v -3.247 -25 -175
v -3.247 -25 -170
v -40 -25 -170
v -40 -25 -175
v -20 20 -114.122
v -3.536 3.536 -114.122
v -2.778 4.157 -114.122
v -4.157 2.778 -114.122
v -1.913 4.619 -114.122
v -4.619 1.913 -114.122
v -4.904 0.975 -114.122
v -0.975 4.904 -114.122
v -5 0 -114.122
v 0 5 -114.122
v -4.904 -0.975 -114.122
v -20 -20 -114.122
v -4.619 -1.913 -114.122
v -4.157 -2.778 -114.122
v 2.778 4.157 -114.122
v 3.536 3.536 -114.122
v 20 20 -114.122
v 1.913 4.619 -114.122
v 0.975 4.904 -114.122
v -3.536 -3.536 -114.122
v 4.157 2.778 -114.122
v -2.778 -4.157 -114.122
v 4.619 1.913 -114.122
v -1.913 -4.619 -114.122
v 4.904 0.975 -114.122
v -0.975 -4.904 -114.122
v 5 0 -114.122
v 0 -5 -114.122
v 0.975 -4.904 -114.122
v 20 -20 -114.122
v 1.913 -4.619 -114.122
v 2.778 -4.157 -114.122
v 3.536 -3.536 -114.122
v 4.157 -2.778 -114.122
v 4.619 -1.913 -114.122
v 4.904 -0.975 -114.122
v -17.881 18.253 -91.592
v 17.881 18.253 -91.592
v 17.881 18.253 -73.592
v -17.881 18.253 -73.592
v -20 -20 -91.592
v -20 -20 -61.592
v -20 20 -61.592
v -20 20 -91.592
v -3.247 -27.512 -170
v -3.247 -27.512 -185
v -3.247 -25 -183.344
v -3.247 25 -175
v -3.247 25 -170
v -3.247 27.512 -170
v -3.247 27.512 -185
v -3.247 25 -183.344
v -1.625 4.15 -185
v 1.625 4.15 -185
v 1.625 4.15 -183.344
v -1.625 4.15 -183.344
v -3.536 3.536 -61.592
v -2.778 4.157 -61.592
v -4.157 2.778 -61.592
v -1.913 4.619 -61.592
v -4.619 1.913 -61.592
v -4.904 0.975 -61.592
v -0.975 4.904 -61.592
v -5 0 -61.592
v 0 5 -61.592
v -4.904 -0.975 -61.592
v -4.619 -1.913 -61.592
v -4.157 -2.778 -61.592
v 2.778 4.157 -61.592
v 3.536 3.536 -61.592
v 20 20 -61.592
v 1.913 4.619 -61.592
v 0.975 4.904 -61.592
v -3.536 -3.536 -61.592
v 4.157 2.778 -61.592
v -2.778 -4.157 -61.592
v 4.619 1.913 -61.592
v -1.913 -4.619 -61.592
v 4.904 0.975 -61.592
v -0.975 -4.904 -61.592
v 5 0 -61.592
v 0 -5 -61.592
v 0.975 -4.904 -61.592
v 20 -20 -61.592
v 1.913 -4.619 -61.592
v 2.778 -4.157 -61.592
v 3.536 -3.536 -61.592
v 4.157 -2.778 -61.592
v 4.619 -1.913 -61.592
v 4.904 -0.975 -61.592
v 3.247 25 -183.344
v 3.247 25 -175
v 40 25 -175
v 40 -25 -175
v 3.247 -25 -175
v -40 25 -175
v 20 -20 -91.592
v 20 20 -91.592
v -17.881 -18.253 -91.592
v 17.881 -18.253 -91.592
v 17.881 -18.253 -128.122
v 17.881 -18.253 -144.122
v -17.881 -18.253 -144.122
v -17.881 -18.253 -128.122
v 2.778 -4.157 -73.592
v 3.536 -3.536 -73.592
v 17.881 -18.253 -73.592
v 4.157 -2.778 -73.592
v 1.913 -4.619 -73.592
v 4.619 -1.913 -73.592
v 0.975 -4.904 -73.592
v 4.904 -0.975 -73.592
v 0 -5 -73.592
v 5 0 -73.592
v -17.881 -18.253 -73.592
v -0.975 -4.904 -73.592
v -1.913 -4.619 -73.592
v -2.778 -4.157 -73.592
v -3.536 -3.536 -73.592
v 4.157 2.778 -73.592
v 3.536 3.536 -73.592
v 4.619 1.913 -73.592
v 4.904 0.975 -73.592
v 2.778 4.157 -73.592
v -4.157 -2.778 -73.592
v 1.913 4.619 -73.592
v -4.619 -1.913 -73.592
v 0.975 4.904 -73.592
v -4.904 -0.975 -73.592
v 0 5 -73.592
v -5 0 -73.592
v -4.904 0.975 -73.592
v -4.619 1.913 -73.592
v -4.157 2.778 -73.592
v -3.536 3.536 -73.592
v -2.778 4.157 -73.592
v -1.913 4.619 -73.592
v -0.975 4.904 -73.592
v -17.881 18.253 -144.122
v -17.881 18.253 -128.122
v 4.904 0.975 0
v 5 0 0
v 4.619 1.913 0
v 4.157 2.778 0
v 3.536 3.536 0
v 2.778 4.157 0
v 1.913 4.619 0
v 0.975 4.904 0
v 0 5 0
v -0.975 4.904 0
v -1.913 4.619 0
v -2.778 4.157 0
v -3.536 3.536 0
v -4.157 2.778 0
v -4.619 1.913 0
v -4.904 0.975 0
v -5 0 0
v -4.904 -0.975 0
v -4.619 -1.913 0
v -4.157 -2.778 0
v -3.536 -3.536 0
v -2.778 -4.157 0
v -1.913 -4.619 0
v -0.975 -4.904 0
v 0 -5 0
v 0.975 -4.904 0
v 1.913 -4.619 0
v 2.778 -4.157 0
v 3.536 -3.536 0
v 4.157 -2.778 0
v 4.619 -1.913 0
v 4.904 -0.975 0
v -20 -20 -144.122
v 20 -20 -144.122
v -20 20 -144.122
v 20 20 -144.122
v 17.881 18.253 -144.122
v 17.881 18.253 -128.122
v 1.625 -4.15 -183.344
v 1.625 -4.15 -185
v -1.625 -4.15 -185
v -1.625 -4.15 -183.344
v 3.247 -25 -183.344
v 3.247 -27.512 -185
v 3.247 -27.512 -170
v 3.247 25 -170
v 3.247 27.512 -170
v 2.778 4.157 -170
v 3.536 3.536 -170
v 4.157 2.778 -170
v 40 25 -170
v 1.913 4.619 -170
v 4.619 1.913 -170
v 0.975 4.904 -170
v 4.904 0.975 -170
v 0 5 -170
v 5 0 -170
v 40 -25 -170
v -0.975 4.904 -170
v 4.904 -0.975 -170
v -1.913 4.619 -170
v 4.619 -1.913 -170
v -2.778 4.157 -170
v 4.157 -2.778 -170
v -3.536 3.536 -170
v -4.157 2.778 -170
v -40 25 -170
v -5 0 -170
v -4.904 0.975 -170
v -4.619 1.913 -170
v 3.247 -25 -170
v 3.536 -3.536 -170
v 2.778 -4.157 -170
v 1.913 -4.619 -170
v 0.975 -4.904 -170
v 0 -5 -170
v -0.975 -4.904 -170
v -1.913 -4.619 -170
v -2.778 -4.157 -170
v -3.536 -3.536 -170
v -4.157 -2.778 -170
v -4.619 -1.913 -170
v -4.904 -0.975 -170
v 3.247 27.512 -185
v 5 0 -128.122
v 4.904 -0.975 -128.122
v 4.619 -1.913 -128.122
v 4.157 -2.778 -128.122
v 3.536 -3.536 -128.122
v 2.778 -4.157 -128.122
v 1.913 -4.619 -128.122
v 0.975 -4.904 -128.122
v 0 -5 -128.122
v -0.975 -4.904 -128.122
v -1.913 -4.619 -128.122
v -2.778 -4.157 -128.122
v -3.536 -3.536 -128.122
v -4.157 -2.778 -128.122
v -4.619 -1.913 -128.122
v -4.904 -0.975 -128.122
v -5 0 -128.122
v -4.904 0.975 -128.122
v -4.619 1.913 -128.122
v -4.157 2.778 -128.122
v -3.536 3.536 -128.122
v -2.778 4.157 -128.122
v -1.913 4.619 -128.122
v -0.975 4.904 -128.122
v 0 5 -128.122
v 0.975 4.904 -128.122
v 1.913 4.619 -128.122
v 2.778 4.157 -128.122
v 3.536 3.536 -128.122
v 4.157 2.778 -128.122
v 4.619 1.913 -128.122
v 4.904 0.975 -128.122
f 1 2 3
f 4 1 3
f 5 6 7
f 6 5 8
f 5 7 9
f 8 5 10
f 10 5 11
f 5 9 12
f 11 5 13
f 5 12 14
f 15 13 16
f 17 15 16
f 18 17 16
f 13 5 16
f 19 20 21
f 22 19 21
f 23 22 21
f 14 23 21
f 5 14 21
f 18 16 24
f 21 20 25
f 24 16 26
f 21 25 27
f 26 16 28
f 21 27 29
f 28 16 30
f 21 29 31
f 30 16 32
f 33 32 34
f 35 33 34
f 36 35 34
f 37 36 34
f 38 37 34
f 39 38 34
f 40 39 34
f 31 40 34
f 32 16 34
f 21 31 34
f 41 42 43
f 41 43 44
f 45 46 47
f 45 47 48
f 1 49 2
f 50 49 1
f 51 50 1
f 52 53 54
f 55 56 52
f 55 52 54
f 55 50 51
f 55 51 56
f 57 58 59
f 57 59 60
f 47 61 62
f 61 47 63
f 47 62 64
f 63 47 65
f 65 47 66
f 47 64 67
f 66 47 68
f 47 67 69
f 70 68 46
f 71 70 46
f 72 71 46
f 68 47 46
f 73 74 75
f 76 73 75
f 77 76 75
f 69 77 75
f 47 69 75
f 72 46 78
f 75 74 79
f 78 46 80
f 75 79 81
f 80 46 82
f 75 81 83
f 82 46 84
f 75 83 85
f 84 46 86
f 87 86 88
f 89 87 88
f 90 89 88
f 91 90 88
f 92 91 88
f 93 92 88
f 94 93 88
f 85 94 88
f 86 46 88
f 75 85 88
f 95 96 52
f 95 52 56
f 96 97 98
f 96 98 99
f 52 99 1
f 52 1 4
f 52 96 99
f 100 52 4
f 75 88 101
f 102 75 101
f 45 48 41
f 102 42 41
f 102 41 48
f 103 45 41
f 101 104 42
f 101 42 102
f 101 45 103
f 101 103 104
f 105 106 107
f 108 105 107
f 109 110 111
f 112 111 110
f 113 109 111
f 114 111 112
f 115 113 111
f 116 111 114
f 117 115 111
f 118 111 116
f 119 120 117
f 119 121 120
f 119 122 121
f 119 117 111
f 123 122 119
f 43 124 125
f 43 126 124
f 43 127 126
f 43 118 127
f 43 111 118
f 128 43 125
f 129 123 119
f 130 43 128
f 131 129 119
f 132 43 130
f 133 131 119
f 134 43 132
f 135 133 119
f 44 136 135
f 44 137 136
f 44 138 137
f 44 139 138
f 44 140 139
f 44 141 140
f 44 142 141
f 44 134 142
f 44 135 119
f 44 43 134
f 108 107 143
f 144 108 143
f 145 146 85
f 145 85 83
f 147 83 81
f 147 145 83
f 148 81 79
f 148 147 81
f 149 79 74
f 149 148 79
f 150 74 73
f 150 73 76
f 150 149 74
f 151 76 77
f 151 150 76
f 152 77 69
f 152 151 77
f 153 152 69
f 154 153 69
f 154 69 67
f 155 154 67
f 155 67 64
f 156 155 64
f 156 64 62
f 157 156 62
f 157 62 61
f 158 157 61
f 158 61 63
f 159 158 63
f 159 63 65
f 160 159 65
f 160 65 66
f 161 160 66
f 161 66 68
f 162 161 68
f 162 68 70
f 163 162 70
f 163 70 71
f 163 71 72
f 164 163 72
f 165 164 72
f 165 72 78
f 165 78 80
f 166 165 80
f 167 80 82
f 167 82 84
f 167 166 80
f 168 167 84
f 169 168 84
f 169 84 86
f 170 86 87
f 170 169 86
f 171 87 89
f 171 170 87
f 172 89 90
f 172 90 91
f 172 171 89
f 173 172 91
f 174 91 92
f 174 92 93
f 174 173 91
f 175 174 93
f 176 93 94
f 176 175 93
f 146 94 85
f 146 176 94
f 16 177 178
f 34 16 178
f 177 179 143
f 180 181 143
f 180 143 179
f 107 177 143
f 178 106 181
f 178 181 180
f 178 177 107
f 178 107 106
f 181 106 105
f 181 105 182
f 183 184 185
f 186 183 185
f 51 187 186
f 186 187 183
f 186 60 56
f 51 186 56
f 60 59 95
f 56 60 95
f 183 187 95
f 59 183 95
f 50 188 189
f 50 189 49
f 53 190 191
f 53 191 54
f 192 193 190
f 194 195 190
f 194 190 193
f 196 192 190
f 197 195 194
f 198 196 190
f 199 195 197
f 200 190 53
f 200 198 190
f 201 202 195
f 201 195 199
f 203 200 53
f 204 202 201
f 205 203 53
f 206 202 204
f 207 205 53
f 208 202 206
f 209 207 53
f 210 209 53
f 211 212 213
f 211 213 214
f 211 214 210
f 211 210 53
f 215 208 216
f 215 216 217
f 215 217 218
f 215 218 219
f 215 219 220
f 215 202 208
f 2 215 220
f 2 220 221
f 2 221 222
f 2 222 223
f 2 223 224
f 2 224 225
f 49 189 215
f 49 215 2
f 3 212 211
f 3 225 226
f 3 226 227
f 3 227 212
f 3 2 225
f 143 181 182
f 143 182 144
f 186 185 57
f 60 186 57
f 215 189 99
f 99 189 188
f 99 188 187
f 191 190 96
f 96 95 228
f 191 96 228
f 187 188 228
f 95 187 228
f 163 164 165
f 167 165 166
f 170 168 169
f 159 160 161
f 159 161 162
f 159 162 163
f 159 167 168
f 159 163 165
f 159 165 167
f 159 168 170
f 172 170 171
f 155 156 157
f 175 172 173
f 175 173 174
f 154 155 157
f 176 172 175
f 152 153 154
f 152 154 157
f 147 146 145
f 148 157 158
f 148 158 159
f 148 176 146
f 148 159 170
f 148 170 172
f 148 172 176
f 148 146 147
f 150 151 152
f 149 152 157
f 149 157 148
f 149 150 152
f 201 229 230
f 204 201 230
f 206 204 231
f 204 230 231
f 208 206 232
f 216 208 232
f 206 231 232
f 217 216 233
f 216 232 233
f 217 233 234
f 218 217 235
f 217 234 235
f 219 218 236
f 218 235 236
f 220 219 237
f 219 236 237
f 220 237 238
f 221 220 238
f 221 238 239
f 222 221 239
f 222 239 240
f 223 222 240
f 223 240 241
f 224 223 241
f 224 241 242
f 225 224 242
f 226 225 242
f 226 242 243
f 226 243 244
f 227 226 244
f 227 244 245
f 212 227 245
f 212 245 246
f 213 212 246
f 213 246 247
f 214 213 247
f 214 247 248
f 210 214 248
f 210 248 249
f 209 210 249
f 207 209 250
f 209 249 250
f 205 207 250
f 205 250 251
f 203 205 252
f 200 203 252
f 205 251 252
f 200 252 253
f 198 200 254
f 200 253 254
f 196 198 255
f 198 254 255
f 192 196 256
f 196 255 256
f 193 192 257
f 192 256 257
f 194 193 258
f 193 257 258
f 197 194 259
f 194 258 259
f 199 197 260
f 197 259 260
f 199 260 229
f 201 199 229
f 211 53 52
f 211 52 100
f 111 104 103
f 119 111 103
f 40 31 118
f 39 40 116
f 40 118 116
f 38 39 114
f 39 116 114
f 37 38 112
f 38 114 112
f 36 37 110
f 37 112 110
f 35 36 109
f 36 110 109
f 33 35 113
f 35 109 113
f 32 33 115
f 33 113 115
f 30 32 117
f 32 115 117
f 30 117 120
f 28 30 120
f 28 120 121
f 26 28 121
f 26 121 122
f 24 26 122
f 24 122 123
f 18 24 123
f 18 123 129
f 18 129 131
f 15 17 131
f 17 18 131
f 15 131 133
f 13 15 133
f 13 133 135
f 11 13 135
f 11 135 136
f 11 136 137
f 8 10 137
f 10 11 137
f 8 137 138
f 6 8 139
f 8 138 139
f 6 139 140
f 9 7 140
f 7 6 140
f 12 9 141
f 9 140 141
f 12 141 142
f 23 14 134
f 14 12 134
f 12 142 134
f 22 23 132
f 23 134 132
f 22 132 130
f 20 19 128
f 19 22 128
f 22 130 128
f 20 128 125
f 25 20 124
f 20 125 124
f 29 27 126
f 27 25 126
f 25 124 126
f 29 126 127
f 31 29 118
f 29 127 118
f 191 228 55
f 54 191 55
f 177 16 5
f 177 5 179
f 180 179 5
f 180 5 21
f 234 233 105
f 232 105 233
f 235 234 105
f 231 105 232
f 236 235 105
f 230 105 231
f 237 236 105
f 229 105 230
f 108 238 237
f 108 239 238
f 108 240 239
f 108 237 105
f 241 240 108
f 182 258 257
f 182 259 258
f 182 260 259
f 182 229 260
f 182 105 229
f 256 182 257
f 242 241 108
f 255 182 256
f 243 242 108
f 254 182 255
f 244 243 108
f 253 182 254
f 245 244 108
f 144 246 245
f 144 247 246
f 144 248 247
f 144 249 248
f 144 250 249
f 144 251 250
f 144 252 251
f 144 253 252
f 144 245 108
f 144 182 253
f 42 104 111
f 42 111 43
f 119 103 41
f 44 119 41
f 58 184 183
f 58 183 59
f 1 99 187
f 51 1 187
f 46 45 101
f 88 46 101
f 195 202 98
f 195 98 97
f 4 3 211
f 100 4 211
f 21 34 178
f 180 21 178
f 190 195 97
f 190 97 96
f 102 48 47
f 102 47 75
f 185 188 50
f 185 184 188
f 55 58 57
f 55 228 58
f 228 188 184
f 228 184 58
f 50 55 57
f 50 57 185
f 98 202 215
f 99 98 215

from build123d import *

# Parameters (mm, degrees)
SKETCH1_R                = 5
BOSS_EXTRUDE1_DEPTH      = 170
BOSS_EXTRUDE2_DEPTH      = 20
BOSS_EXTRUDE2_DEPTH_BACK = 20
SKETCH2_W                = 40
SKETCH2_H                = 30
SKETCH3_W                = 35.762712216
SKETCH3_H                = 36.50555787
CUT_EXTRUDE5_DEPTH       = 16
SKETCH5_R                = 5
BOSS_EXTRUDE3_DEPTH      = 16
SKETCH8_W                = 35.762712216
SKETCH8_H                = 36.50555787
CUT_EXTRUDE7_DEPTH       = 18
SKETCH10_R               = 5
BOSS_EXTRUDE4_DEPTH      = 18
SKETCH11_W               = 80
SKETCH11_H               = 50
BOSS_EXTRUDE5_DEPTH      = 5
BOSS_EXTRUDE6_REACH      = 192.919
SKETCH13_W               = 6.494593436
SKETCH13_H               = 55.023638824
SKETCH16_W               = 8.344392414
SKETCH16_H               = 50
CUT_EXTRUDE9_DEPTH       = 10
SKETCH17_W               = 3.25
SKETCH17_H               = 8.3
CUT_EXTRUDE10_DEPTH      = 10


with BuildPart() as part:
    # Sketch1 → Boss-Extrude1 (new body)
    with BuildSketch(Plane.XY):
        Circle(SKETCH1_R)
    extrude(amount=-BOSS_EXTRUDE1_DEPTH)

    # Sketch2 → Boss-Extrude2 (add, two sides: drawn at the far end of the back side and taken through both)
    with BuildSketch(Plane(origin=(0, 0, 0), x_dir=(1, 0, 0), z_dir=(0, 1, 0)).offset(-BOSS_EXTRUDE2_DEPTH_BACK)):
        with Locations((0, 76.591812116)):
            Rectangle(SKETCH2_W, SKETCH2_H)
        with Locations((0, 129.121611958)):
            Rectangle(SKETCH2_W, SKETCH2_H)
    extrude(amount=BOSS_EXTRUDE2_DEPTH + BOSS_EXTRUDE2_DEPTH_BACK)

    # Sketch3 → Cut-Extrude5 (cut)
    with BuildSketch(Plane(origin=(0, 0, -144.121611958), x_dir=(-1, 0, 0), z_dir=(0, 0, -1))):
        Rectangle(SKETCH3_W, SKETCH3_H)
    extrude(amount=-CUT_EXTRUDE5_DEPTH, mode=Mode.SUBTRACT)


with BuildPart() as cut_extrude5_piece_1:
    # of the separate pieces the step leaves, piece 1, a body of its own (cut_extrude5_pieces)
    add(part.part.solids().sort_by_distance((5, 0, 0))[0])



with BuildPart() as cut_extrude5_piece_2:
    # of the separate pieces the step leaves, piece 2, a body of its own (cut_extrude5_pieces)
    add(part.part.solids().sort_by_distance((5, 0, -144.121611958))[0])


with BuildPart() as cut_extrude5_piece_1_1:
    add(cut_extrude5_piece_1.part)

    add(cut_extrude5_piece_2.part)  # Boss-Extrude3 merges Cut-Extrude5 piece 2
    # Sketch5 → Boss-Extrude3 (add)
    with BuildSketch(Plane(origin=(0, 0, -128.121611958), x_dir=(-1, 0, 0), z_dir=(0, 0, -1))):
        with Locations(Location((0, 0, 0), (0, 0, 180))):
            Circle(SKETCH5_R)
    extrude(amount=BOSS_EXTRUDE3_DEPTH)

    # Sketch8 → Cut-Extrude7 (cut)
    with BuildSketch(Plane(origin=(0, 0, -91.591812116), x_dir=(-1, 0, 0), z_dir=(0, 0, -1))):
        Rectangle(SKETCH8_W, SKETCH8_H)
    extrude(amount=-CUT_EXTRUDE7_DEPTH, mode=Mode.SUBTRACT)


with BuildPart() as cut_extrude7_piece_1:
    # of the separate pieces the step leaves, piece 1, a body of its own (cut_extrude7_pieces)
    add(cut_extrude5_piece_1_1.part.solids().sort_by_distance((5, 0, -144.121611958))[0])



with BuildPart() as cut_extrude7_piece_2:
    # of the separate pieces the step leaves, piece 2, a body of its own (cut_extrude7_pieces)
    add(cut_extrude5_piece_1_1.part.solids().sort_by_distance((-20, 20, -91.591812116))[0])


with BuildPart() as cut_extrude7_piece_1_1:
    add(cut_extrude7_piece_1.part)

    add(cut_extrude7_piece_2.part)  # Boss-Extrude4 merges Cut-Extrude7 piece 2
    # Sketch10 → Boss-Extrude4 (add)
    with BuildSketch(Plane(origin=(0, 0, -73.591812116), x_dir=(-1, 0, 0), z_dir=(0, 0, -1))):
        with Locations(Location((0, 0, 0), (0, 0, 180))):
            Circle(SKETCH10_R)
    extrude(amount=BOSS_EXTRUDE4_DEPTH)

    # Sketch11 → Boss-Extrude5 (add)
    with BuildSketch(Plane(origin=(0, 0, -170), x_dir=(-1, 0, 0), z_dir=(0, 0, -1))):
        Rectangle(SKETCH11_W, SKETCH11_H)
    extrude(amount=BOSS_EXTRUDE5_DEPTH)

    # Boss-Extrude6: up to this face of the body (flat: up to its plane)
    boss_extrude6_end = Plane(cut_extrude7_piece_1_1.part.faces().sort_by_distance((0, -24.056601887, -170))[0])
    # Sketch13 → Boss-Extrude6 (add, up to the picked face)
    with BuildSketch(Plane(origin=(0, 0, -185), x_dir=(-1, 0, 0), z_dir=(0, 0, -1)), mode=Mode.PRIVATE) as boss_extrude6_sk1:
        Rectangle(SKETCH13_W, SKETCH13_H)
    boss_extrude6_tool1 = split(extrude(boss_extrude6_sk1.sketch, amount=-BOSS_EXTRUDE6_REACH, mode=Mode.PRIVATE), bisect_by=boss_extrude6_end, keep=Keep.BOTH, mode=Mode.PRIVATE)
    add(boss_extrude6_tool1.solids().sort_by(Axis((0, 0, -185), (0, 0, 1)))[0])

    # Sketch16 → Cut-Extrude9 (cut)
    with BuildSketch(Plane(origin=(3.247296718, 0, 0), x_dir=(0, 0, -1), z_dir=(1, 0, 0))):
        with Locations((179.172196207, 0)):
            Rectangle(SKETCH16_W, SKETCH16_H)
    extrude(amount=-CUT_EXTRUDE9_DEPTH, mode=Mode.SUBTRACT)

    # Sketch17 → Cut-Extrude10 (cut)
    with BuildSketch(Plane(origin=(0, 0, -185), x_dir=(-1, 0, 0), z_dir=(0, 0, -1))):
        Rectangle(SKETCH17_W, SKETCH17_H)
    extrude(amount=-CUT_EXTRUDE10_DEPTH, mode=Mode.SUBTRACT)


solid = cut_extrude7_piece_1_1.part
